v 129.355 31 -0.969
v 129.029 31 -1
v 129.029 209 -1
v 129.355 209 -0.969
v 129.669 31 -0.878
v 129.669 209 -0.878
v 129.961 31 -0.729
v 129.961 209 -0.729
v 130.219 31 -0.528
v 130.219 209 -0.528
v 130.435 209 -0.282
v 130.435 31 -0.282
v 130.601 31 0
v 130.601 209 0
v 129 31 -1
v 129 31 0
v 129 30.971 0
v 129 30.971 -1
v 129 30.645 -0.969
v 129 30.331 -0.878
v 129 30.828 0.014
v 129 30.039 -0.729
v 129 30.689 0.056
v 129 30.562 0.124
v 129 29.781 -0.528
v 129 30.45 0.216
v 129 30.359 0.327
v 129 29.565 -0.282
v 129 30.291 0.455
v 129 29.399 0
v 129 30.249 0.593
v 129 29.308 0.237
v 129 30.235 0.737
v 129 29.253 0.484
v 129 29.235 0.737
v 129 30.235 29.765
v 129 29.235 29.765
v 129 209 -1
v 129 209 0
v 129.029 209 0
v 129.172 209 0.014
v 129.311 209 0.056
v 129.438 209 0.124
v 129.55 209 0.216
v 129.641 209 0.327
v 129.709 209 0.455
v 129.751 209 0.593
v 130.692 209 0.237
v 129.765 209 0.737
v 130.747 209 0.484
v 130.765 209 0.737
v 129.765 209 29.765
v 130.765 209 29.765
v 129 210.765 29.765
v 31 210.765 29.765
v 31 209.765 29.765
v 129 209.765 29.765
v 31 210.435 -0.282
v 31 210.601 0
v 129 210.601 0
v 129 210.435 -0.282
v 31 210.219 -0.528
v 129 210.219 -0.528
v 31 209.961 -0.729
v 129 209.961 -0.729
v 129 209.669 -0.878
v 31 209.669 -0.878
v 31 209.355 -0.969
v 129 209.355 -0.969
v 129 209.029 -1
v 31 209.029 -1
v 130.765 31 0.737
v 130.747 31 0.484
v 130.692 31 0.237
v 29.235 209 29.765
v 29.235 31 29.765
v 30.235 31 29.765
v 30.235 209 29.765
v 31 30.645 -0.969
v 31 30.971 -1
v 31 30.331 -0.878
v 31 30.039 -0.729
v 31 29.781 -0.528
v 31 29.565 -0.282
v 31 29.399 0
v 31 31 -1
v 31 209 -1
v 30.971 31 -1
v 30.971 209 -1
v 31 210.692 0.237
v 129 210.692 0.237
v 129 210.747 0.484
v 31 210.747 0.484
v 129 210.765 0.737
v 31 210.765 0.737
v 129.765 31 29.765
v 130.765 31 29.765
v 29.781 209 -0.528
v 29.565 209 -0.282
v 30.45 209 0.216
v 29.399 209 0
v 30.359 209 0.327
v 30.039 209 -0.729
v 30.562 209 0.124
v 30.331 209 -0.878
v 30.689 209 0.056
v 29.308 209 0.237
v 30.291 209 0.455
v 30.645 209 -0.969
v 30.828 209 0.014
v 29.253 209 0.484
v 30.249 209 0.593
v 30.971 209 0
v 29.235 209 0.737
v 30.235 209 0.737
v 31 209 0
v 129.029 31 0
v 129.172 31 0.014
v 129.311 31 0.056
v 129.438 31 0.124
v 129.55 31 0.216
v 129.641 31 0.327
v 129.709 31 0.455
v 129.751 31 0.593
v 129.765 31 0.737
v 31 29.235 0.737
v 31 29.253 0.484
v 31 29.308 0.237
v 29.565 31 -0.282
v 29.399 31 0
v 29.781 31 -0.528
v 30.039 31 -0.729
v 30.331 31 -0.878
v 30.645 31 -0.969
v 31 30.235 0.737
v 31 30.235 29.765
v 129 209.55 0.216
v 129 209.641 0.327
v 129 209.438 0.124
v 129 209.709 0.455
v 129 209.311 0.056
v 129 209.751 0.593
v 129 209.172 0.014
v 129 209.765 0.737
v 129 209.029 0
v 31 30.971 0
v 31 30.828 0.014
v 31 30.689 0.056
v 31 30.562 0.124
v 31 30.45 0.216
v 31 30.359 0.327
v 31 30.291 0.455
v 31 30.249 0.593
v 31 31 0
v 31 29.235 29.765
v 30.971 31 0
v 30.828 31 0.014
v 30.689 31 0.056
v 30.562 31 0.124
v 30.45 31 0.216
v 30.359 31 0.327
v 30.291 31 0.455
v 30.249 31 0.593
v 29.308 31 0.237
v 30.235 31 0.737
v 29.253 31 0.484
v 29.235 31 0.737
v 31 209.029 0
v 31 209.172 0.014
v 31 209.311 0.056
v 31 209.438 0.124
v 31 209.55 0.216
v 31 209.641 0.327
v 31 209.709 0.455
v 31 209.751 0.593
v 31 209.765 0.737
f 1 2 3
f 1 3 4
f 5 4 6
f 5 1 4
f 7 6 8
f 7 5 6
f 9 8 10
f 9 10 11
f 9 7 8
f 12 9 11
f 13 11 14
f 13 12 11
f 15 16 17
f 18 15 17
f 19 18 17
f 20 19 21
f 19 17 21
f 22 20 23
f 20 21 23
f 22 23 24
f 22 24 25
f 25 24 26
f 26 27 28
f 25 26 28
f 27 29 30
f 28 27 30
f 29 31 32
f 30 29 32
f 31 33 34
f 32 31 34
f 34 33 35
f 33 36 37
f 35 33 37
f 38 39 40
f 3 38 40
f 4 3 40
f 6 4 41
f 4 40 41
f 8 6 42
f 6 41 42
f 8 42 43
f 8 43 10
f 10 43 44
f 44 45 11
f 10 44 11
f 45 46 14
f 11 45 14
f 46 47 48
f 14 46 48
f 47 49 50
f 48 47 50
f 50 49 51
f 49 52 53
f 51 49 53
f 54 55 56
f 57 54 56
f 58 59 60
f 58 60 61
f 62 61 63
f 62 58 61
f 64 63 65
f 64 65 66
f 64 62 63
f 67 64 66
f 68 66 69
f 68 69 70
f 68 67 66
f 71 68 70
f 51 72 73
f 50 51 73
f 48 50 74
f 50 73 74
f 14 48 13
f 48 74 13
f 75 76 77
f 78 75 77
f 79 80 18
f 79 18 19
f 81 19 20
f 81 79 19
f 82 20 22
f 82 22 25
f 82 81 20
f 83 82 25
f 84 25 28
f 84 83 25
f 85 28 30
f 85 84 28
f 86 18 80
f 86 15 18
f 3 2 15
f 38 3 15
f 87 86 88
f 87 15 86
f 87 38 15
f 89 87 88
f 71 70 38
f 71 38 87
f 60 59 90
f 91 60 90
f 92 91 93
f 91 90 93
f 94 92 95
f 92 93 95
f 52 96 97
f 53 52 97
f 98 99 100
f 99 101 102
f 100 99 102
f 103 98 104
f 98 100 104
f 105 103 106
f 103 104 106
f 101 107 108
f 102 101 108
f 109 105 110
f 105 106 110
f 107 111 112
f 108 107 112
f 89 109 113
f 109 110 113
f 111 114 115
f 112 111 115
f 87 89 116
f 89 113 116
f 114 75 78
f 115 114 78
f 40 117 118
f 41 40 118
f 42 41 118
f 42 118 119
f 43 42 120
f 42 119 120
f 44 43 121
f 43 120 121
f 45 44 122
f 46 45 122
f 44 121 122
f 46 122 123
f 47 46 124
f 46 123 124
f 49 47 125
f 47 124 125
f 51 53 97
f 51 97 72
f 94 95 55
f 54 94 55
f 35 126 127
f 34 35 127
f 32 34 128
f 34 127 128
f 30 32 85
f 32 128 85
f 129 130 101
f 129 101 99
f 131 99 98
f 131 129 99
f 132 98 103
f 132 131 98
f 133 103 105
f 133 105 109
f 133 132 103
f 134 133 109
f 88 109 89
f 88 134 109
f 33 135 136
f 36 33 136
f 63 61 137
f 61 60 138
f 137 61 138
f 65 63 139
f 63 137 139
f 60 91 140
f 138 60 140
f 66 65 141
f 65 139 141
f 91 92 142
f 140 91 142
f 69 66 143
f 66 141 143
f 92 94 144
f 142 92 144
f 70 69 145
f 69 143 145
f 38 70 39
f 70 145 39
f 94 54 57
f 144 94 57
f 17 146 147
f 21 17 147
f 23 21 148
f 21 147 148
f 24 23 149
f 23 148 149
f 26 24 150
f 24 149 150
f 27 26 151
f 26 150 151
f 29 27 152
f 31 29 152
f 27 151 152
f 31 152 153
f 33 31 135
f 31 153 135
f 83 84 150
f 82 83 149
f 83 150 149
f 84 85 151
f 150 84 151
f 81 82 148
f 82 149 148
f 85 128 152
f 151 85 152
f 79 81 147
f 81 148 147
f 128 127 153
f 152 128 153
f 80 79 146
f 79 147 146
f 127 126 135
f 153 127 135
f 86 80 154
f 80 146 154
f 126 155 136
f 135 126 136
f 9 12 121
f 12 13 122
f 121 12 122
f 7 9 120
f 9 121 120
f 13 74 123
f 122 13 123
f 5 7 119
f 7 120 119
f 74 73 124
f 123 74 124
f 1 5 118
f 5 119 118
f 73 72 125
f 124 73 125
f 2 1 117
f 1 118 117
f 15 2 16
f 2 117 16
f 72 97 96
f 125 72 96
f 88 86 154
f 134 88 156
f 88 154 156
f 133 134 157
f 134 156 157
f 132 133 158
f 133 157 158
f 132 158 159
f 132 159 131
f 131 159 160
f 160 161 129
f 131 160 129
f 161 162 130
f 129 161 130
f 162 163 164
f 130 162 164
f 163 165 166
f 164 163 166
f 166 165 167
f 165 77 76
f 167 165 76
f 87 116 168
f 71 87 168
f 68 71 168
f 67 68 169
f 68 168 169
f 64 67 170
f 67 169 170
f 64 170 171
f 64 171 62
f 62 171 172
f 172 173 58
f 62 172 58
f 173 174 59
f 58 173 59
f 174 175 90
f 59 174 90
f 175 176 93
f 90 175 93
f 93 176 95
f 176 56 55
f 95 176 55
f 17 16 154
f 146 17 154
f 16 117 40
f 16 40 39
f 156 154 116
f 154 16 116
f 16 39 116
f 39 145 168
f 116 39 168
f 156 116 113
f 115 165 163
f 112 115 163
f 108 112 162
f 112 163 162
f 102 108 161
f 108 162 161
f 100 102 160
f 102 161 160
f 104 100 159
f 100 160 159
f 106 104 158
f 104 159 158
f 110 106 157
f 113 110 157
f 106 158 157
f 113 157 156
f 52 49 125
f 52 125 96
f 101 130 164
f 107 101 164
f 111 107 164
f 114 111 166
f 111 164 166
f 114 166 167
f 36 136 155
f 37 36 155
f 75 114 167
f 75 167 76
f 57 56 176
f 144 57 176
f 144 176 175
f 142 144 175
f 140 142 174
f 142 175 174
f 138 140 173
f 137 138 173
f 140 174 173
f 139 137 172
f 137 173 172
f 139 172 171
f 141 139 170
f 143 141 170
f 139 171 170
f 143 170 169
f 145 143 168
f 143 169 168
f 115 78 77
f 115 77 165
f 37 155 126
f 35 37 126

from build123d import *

# Parameters (mm, degrees)
BASE_FLANGE1_DEPTH         = 1
SKETCHED_START             = 31
SKETCHED_BEND1_DEPTH       = 178
SKETCHED_BEND1_2_DEPTH     = 98
SKETCHED_BEND1_3_DEPTH     = 178
SKETCHED_BEND1_4_OUTLINE_W = 98
SKETCHED_BEND1_4_OUTLINE_H = 1
SKETCHED_BEND1_4_DEPTH     = 29.234623369
SKETCHED_START_2           = 210.765376631
SKETCHED_BEND1_5_OUTLINE_W = 98
SKETCHED_BEND1_5_OUTLINE_H = 1
SKETCHED_BEND1_5_DEPTH     = 29.234623369
SKETCHED_BEND1_6_DEPTH     = 98
SKETCHED_BEND1_7_OUTLINE_W = 178
SKETCHED_BEND1_7_OUTLINE_H = 1
SKETCHED_BEND1_7_DEPTH     = 29.234623369
SKETCHED_START_3           = 130.765376631
SKETCHED_BEND1_8_OUTLINE_W = 178
SKETCHED_BEND1_8_OUTLINE_H = 1
SKETCHED_BEND1_8_DEPTH     = 29.234623369


# Read off the part's stored shape, not the designer's step: Sketched Bend1
# Sheet-metal steps are written as plain solids
with BuildPart() as part:
    # Sketch1 → Base-Flange1 (new body)
    with BuildSketch(Plane.XY):
        Polygon((0, 209), (31, 209), (31, 240), (129, 240), (129, 209), (160, 209), (160, 31), (129, 31), (129, 0), (31, 0), (31, 31), (0, 31), align=None)
    extrude(amount=-BASE_FLANGE1_DEPTH)

    # Sketched Bend1 outline → Sketched Bend1 (add)
    with BuildSketch(Plane(origin=(0, 0, 0), x_dir=(1, 0, 0), z_dir=(0, 1, 0)).offset(SKETCHED_START)):
        with BuildLine():
            Line((29.234623369, -0.7366), (29.234623369, -29.765376631))
            Line((29.234623369, -29.765376631), (30.234623369, -29.765376631))
            Line((30.234623369, -29.765376631), (30.234623369, -0.7366))
            ThreePointArc((30.234623369, -0.7366), (30.450368514, -0.215745145), (30.971223369, 0))
            Line((30.971223369, 0), (29.398582279, 0))
            ThreePointArc((29.398582279, 0), (29.276108612, -0.359286442), (29.234623369, -0.7366))
        make_face()
        with BuildLine():
            Line((130.601417721, 0), (129.028776631, 0))
            ThreePointArc((129.028776631, 0), (129.549631486, -0.215745145), (129.765376631, -0.7366))
            Line((129.765376631, -0.7366), (129.765376631, -29.765376631))
            Line((129.765376631, -29.765376631), (130.765376631, -29.765376631))
            Line((130.765376631, -29.765376631), (130.765376631, -0.7366))
            ThreePointArc((130.765376631, -0.7366), (130.723891388, -0.359286442), (130.601417721, 0))
        make_face()
    extrude(amount=SKETCHED_BEND1_DEPTH)

    # Sketched Bend1 2 outline → Sketched Bend1 2 (add)
    with BuildSketch(Plane.YZ.offset(SKETCHED_START)):
        with BuildLine():
            Line((209.028776631, 0), (210.601417721, 0))
            ThreePointArc((210.601417721, 0), (210.723891388, 0.359286442), (210.765376631, 0.7366))
            Line((210.765376631, 0.7366), (210.765376631, 29.765376631))
            Line((210.765376631, 29.765376631), (209.765376631, 29.765376631))
            Line((209.765376631, 29.765376631), (209.765376631, 0.7366))
            ThreePointArc((209.765376631, 0.7366), (209.549631486, 0.215745145), (209.028776631, 0))
        make_face()
        with BuildLine():
            ThreePointArc((29.234623369, 0.7366), (29.276108612, 0.359286442), (29.398582279, 0))
            Line((29.398582279, 0), (30.971223369, 0))
            ThreePointArc((30.971223369, 0), (30.450368514, 0.215745145), (30.234623369, 0.7366))
            Line((30.234623369, 0.7366), (30.234623369, 29.765376631))
            Line((30.234623369, 29.765376631), (29.234623369, 29.765376631))
            Line((29.234623369, 29.765376631), (29.234623369, 0.7366))
        make_face()
    extrude(amount=SKETCHED_BEND1_2_DEPTH)

    # Sketched Bend1 3 outline → Sketched Bend1 3 (cut)
    with BuildSketch(Plane(origin=(0, 0, 0), x_dir=(1, 0, 0), z_dir=(0, 1, 0)).offset(SKETCHED_START)):
        with BuildLine():
            Line((0, 0), (29.398582279, 0))
            ThreePointArc((29.398582279, 0), (30.039397205, 0.728828115), (30.971223369, 1))
            Line((30.971223369, 1), (0, 1))
            Line((0, 1), (0, 0))
        make_face()
        with BuildLine():
            Line((160, 1), (129.028776631, 1))
            ThreePointArc((129.028776631, 1), (129.960602795, 0.728828115), (130.601417721, 0))
            Line((130.601417721, 0), (160, 0))
            Line((160, 0), (160, 1))
        make_face()
    extrude(amount=SKETCHED_BEND1_3_DEPTH, mode=Mode.SUBTRACT)

    # Sketched Bend1 4 outline → Sketched Bend1 4 (cut)
    with BuildSketch(Plane(origin=(0, 0, 0), x_dir=(1, 0, 0), z_dir=(0, 1, 0))):
        with Locations((80, 0.5)):
            Rectangle(SKETCHED_BEND1_4_OUTLINE_W, SKETCHED_BEND1_4_OUTLINE_H)
    extrude(amount=SKETCHED_BEND1_4_DEPTH, mode=Mode.SUBTRACT)

    # Sketched Bend1 5 outline → Sketched Bend1 5 (cut)
    with BuildSketch(Plane(origin=(0, 0, 0), x_dir=(1, 0, 0), z_dir=(0, 1, 0)).offset(SKETCHED_START_2)):
        with Locations((80, 0.5)):
            Rectangle(SKETCHED_BEND1_5_OUTLINE_W, SKETCHED_BEND1_5_OUTLINE_H)
    extrude(amount=SKETCHED_BEND1_5_DEPTH, mode=Mode.SUBTRACT)

    # Sketched Bend1 6 outline → Sketched Bend1 6 (cut)
    with BuildSketch(Plane.YZ.offset(SKETCHED_START)):
        with BuildLine():
            ThreePointArc((210.601417721, 0), (209.960602795, -0.728828115), (209.028776631, -1))
            Line((209.028776631, -1), (240, -1))
            Line((240, -1), (240, 0))
            Line((240, 0), (210.601417721, 0))
        make_face()
        with BuildLine():
            Line((0, -1), (30.971223369, -1))
            ThreePointArc((30.971223369, -1), (30.039397205, -0.728828115), (29.398582279, 0))
            Line((29.398582279, 0), (0, 0))
            Line((0, 0), (0, -1))
        make_face()
    extrude(amount=SKETCHED_BEND1_6_DEPTH, mode=Mode.SUBTRACT)

    # Sketched Bend1 7 outline → Sketched Bend1 7 (cut)
    with BuildSketch(Plane.YZ):
        with Locations((120, -0.5)):
            Rectangle(SKETCHED_BEND1_7_OUTLINE_W, SKETCHED_BEND1_7_OUTLINE_H)
    extrude(amount=SKETCHED_BEND1_7_DEPTH, mode=Mode.SUBTRACT)

    # Sketched Bend1 8 outline → Sketched Bend1 8 (cut)
    with BuildSketch(Plane.YZ.offset(SKETCHED_START_3)):
        with Locations((120, -0.5)):
            Rectangle(SKETCHED_BEND1_8_OUTLINE_W, SKETCHED_BEND1_8_OUTLINE_H)
    extrude(amount=SKETCHED_BEND1_8_DEPTH, mode=Mode.SUBTRACT)


solid = part.part
